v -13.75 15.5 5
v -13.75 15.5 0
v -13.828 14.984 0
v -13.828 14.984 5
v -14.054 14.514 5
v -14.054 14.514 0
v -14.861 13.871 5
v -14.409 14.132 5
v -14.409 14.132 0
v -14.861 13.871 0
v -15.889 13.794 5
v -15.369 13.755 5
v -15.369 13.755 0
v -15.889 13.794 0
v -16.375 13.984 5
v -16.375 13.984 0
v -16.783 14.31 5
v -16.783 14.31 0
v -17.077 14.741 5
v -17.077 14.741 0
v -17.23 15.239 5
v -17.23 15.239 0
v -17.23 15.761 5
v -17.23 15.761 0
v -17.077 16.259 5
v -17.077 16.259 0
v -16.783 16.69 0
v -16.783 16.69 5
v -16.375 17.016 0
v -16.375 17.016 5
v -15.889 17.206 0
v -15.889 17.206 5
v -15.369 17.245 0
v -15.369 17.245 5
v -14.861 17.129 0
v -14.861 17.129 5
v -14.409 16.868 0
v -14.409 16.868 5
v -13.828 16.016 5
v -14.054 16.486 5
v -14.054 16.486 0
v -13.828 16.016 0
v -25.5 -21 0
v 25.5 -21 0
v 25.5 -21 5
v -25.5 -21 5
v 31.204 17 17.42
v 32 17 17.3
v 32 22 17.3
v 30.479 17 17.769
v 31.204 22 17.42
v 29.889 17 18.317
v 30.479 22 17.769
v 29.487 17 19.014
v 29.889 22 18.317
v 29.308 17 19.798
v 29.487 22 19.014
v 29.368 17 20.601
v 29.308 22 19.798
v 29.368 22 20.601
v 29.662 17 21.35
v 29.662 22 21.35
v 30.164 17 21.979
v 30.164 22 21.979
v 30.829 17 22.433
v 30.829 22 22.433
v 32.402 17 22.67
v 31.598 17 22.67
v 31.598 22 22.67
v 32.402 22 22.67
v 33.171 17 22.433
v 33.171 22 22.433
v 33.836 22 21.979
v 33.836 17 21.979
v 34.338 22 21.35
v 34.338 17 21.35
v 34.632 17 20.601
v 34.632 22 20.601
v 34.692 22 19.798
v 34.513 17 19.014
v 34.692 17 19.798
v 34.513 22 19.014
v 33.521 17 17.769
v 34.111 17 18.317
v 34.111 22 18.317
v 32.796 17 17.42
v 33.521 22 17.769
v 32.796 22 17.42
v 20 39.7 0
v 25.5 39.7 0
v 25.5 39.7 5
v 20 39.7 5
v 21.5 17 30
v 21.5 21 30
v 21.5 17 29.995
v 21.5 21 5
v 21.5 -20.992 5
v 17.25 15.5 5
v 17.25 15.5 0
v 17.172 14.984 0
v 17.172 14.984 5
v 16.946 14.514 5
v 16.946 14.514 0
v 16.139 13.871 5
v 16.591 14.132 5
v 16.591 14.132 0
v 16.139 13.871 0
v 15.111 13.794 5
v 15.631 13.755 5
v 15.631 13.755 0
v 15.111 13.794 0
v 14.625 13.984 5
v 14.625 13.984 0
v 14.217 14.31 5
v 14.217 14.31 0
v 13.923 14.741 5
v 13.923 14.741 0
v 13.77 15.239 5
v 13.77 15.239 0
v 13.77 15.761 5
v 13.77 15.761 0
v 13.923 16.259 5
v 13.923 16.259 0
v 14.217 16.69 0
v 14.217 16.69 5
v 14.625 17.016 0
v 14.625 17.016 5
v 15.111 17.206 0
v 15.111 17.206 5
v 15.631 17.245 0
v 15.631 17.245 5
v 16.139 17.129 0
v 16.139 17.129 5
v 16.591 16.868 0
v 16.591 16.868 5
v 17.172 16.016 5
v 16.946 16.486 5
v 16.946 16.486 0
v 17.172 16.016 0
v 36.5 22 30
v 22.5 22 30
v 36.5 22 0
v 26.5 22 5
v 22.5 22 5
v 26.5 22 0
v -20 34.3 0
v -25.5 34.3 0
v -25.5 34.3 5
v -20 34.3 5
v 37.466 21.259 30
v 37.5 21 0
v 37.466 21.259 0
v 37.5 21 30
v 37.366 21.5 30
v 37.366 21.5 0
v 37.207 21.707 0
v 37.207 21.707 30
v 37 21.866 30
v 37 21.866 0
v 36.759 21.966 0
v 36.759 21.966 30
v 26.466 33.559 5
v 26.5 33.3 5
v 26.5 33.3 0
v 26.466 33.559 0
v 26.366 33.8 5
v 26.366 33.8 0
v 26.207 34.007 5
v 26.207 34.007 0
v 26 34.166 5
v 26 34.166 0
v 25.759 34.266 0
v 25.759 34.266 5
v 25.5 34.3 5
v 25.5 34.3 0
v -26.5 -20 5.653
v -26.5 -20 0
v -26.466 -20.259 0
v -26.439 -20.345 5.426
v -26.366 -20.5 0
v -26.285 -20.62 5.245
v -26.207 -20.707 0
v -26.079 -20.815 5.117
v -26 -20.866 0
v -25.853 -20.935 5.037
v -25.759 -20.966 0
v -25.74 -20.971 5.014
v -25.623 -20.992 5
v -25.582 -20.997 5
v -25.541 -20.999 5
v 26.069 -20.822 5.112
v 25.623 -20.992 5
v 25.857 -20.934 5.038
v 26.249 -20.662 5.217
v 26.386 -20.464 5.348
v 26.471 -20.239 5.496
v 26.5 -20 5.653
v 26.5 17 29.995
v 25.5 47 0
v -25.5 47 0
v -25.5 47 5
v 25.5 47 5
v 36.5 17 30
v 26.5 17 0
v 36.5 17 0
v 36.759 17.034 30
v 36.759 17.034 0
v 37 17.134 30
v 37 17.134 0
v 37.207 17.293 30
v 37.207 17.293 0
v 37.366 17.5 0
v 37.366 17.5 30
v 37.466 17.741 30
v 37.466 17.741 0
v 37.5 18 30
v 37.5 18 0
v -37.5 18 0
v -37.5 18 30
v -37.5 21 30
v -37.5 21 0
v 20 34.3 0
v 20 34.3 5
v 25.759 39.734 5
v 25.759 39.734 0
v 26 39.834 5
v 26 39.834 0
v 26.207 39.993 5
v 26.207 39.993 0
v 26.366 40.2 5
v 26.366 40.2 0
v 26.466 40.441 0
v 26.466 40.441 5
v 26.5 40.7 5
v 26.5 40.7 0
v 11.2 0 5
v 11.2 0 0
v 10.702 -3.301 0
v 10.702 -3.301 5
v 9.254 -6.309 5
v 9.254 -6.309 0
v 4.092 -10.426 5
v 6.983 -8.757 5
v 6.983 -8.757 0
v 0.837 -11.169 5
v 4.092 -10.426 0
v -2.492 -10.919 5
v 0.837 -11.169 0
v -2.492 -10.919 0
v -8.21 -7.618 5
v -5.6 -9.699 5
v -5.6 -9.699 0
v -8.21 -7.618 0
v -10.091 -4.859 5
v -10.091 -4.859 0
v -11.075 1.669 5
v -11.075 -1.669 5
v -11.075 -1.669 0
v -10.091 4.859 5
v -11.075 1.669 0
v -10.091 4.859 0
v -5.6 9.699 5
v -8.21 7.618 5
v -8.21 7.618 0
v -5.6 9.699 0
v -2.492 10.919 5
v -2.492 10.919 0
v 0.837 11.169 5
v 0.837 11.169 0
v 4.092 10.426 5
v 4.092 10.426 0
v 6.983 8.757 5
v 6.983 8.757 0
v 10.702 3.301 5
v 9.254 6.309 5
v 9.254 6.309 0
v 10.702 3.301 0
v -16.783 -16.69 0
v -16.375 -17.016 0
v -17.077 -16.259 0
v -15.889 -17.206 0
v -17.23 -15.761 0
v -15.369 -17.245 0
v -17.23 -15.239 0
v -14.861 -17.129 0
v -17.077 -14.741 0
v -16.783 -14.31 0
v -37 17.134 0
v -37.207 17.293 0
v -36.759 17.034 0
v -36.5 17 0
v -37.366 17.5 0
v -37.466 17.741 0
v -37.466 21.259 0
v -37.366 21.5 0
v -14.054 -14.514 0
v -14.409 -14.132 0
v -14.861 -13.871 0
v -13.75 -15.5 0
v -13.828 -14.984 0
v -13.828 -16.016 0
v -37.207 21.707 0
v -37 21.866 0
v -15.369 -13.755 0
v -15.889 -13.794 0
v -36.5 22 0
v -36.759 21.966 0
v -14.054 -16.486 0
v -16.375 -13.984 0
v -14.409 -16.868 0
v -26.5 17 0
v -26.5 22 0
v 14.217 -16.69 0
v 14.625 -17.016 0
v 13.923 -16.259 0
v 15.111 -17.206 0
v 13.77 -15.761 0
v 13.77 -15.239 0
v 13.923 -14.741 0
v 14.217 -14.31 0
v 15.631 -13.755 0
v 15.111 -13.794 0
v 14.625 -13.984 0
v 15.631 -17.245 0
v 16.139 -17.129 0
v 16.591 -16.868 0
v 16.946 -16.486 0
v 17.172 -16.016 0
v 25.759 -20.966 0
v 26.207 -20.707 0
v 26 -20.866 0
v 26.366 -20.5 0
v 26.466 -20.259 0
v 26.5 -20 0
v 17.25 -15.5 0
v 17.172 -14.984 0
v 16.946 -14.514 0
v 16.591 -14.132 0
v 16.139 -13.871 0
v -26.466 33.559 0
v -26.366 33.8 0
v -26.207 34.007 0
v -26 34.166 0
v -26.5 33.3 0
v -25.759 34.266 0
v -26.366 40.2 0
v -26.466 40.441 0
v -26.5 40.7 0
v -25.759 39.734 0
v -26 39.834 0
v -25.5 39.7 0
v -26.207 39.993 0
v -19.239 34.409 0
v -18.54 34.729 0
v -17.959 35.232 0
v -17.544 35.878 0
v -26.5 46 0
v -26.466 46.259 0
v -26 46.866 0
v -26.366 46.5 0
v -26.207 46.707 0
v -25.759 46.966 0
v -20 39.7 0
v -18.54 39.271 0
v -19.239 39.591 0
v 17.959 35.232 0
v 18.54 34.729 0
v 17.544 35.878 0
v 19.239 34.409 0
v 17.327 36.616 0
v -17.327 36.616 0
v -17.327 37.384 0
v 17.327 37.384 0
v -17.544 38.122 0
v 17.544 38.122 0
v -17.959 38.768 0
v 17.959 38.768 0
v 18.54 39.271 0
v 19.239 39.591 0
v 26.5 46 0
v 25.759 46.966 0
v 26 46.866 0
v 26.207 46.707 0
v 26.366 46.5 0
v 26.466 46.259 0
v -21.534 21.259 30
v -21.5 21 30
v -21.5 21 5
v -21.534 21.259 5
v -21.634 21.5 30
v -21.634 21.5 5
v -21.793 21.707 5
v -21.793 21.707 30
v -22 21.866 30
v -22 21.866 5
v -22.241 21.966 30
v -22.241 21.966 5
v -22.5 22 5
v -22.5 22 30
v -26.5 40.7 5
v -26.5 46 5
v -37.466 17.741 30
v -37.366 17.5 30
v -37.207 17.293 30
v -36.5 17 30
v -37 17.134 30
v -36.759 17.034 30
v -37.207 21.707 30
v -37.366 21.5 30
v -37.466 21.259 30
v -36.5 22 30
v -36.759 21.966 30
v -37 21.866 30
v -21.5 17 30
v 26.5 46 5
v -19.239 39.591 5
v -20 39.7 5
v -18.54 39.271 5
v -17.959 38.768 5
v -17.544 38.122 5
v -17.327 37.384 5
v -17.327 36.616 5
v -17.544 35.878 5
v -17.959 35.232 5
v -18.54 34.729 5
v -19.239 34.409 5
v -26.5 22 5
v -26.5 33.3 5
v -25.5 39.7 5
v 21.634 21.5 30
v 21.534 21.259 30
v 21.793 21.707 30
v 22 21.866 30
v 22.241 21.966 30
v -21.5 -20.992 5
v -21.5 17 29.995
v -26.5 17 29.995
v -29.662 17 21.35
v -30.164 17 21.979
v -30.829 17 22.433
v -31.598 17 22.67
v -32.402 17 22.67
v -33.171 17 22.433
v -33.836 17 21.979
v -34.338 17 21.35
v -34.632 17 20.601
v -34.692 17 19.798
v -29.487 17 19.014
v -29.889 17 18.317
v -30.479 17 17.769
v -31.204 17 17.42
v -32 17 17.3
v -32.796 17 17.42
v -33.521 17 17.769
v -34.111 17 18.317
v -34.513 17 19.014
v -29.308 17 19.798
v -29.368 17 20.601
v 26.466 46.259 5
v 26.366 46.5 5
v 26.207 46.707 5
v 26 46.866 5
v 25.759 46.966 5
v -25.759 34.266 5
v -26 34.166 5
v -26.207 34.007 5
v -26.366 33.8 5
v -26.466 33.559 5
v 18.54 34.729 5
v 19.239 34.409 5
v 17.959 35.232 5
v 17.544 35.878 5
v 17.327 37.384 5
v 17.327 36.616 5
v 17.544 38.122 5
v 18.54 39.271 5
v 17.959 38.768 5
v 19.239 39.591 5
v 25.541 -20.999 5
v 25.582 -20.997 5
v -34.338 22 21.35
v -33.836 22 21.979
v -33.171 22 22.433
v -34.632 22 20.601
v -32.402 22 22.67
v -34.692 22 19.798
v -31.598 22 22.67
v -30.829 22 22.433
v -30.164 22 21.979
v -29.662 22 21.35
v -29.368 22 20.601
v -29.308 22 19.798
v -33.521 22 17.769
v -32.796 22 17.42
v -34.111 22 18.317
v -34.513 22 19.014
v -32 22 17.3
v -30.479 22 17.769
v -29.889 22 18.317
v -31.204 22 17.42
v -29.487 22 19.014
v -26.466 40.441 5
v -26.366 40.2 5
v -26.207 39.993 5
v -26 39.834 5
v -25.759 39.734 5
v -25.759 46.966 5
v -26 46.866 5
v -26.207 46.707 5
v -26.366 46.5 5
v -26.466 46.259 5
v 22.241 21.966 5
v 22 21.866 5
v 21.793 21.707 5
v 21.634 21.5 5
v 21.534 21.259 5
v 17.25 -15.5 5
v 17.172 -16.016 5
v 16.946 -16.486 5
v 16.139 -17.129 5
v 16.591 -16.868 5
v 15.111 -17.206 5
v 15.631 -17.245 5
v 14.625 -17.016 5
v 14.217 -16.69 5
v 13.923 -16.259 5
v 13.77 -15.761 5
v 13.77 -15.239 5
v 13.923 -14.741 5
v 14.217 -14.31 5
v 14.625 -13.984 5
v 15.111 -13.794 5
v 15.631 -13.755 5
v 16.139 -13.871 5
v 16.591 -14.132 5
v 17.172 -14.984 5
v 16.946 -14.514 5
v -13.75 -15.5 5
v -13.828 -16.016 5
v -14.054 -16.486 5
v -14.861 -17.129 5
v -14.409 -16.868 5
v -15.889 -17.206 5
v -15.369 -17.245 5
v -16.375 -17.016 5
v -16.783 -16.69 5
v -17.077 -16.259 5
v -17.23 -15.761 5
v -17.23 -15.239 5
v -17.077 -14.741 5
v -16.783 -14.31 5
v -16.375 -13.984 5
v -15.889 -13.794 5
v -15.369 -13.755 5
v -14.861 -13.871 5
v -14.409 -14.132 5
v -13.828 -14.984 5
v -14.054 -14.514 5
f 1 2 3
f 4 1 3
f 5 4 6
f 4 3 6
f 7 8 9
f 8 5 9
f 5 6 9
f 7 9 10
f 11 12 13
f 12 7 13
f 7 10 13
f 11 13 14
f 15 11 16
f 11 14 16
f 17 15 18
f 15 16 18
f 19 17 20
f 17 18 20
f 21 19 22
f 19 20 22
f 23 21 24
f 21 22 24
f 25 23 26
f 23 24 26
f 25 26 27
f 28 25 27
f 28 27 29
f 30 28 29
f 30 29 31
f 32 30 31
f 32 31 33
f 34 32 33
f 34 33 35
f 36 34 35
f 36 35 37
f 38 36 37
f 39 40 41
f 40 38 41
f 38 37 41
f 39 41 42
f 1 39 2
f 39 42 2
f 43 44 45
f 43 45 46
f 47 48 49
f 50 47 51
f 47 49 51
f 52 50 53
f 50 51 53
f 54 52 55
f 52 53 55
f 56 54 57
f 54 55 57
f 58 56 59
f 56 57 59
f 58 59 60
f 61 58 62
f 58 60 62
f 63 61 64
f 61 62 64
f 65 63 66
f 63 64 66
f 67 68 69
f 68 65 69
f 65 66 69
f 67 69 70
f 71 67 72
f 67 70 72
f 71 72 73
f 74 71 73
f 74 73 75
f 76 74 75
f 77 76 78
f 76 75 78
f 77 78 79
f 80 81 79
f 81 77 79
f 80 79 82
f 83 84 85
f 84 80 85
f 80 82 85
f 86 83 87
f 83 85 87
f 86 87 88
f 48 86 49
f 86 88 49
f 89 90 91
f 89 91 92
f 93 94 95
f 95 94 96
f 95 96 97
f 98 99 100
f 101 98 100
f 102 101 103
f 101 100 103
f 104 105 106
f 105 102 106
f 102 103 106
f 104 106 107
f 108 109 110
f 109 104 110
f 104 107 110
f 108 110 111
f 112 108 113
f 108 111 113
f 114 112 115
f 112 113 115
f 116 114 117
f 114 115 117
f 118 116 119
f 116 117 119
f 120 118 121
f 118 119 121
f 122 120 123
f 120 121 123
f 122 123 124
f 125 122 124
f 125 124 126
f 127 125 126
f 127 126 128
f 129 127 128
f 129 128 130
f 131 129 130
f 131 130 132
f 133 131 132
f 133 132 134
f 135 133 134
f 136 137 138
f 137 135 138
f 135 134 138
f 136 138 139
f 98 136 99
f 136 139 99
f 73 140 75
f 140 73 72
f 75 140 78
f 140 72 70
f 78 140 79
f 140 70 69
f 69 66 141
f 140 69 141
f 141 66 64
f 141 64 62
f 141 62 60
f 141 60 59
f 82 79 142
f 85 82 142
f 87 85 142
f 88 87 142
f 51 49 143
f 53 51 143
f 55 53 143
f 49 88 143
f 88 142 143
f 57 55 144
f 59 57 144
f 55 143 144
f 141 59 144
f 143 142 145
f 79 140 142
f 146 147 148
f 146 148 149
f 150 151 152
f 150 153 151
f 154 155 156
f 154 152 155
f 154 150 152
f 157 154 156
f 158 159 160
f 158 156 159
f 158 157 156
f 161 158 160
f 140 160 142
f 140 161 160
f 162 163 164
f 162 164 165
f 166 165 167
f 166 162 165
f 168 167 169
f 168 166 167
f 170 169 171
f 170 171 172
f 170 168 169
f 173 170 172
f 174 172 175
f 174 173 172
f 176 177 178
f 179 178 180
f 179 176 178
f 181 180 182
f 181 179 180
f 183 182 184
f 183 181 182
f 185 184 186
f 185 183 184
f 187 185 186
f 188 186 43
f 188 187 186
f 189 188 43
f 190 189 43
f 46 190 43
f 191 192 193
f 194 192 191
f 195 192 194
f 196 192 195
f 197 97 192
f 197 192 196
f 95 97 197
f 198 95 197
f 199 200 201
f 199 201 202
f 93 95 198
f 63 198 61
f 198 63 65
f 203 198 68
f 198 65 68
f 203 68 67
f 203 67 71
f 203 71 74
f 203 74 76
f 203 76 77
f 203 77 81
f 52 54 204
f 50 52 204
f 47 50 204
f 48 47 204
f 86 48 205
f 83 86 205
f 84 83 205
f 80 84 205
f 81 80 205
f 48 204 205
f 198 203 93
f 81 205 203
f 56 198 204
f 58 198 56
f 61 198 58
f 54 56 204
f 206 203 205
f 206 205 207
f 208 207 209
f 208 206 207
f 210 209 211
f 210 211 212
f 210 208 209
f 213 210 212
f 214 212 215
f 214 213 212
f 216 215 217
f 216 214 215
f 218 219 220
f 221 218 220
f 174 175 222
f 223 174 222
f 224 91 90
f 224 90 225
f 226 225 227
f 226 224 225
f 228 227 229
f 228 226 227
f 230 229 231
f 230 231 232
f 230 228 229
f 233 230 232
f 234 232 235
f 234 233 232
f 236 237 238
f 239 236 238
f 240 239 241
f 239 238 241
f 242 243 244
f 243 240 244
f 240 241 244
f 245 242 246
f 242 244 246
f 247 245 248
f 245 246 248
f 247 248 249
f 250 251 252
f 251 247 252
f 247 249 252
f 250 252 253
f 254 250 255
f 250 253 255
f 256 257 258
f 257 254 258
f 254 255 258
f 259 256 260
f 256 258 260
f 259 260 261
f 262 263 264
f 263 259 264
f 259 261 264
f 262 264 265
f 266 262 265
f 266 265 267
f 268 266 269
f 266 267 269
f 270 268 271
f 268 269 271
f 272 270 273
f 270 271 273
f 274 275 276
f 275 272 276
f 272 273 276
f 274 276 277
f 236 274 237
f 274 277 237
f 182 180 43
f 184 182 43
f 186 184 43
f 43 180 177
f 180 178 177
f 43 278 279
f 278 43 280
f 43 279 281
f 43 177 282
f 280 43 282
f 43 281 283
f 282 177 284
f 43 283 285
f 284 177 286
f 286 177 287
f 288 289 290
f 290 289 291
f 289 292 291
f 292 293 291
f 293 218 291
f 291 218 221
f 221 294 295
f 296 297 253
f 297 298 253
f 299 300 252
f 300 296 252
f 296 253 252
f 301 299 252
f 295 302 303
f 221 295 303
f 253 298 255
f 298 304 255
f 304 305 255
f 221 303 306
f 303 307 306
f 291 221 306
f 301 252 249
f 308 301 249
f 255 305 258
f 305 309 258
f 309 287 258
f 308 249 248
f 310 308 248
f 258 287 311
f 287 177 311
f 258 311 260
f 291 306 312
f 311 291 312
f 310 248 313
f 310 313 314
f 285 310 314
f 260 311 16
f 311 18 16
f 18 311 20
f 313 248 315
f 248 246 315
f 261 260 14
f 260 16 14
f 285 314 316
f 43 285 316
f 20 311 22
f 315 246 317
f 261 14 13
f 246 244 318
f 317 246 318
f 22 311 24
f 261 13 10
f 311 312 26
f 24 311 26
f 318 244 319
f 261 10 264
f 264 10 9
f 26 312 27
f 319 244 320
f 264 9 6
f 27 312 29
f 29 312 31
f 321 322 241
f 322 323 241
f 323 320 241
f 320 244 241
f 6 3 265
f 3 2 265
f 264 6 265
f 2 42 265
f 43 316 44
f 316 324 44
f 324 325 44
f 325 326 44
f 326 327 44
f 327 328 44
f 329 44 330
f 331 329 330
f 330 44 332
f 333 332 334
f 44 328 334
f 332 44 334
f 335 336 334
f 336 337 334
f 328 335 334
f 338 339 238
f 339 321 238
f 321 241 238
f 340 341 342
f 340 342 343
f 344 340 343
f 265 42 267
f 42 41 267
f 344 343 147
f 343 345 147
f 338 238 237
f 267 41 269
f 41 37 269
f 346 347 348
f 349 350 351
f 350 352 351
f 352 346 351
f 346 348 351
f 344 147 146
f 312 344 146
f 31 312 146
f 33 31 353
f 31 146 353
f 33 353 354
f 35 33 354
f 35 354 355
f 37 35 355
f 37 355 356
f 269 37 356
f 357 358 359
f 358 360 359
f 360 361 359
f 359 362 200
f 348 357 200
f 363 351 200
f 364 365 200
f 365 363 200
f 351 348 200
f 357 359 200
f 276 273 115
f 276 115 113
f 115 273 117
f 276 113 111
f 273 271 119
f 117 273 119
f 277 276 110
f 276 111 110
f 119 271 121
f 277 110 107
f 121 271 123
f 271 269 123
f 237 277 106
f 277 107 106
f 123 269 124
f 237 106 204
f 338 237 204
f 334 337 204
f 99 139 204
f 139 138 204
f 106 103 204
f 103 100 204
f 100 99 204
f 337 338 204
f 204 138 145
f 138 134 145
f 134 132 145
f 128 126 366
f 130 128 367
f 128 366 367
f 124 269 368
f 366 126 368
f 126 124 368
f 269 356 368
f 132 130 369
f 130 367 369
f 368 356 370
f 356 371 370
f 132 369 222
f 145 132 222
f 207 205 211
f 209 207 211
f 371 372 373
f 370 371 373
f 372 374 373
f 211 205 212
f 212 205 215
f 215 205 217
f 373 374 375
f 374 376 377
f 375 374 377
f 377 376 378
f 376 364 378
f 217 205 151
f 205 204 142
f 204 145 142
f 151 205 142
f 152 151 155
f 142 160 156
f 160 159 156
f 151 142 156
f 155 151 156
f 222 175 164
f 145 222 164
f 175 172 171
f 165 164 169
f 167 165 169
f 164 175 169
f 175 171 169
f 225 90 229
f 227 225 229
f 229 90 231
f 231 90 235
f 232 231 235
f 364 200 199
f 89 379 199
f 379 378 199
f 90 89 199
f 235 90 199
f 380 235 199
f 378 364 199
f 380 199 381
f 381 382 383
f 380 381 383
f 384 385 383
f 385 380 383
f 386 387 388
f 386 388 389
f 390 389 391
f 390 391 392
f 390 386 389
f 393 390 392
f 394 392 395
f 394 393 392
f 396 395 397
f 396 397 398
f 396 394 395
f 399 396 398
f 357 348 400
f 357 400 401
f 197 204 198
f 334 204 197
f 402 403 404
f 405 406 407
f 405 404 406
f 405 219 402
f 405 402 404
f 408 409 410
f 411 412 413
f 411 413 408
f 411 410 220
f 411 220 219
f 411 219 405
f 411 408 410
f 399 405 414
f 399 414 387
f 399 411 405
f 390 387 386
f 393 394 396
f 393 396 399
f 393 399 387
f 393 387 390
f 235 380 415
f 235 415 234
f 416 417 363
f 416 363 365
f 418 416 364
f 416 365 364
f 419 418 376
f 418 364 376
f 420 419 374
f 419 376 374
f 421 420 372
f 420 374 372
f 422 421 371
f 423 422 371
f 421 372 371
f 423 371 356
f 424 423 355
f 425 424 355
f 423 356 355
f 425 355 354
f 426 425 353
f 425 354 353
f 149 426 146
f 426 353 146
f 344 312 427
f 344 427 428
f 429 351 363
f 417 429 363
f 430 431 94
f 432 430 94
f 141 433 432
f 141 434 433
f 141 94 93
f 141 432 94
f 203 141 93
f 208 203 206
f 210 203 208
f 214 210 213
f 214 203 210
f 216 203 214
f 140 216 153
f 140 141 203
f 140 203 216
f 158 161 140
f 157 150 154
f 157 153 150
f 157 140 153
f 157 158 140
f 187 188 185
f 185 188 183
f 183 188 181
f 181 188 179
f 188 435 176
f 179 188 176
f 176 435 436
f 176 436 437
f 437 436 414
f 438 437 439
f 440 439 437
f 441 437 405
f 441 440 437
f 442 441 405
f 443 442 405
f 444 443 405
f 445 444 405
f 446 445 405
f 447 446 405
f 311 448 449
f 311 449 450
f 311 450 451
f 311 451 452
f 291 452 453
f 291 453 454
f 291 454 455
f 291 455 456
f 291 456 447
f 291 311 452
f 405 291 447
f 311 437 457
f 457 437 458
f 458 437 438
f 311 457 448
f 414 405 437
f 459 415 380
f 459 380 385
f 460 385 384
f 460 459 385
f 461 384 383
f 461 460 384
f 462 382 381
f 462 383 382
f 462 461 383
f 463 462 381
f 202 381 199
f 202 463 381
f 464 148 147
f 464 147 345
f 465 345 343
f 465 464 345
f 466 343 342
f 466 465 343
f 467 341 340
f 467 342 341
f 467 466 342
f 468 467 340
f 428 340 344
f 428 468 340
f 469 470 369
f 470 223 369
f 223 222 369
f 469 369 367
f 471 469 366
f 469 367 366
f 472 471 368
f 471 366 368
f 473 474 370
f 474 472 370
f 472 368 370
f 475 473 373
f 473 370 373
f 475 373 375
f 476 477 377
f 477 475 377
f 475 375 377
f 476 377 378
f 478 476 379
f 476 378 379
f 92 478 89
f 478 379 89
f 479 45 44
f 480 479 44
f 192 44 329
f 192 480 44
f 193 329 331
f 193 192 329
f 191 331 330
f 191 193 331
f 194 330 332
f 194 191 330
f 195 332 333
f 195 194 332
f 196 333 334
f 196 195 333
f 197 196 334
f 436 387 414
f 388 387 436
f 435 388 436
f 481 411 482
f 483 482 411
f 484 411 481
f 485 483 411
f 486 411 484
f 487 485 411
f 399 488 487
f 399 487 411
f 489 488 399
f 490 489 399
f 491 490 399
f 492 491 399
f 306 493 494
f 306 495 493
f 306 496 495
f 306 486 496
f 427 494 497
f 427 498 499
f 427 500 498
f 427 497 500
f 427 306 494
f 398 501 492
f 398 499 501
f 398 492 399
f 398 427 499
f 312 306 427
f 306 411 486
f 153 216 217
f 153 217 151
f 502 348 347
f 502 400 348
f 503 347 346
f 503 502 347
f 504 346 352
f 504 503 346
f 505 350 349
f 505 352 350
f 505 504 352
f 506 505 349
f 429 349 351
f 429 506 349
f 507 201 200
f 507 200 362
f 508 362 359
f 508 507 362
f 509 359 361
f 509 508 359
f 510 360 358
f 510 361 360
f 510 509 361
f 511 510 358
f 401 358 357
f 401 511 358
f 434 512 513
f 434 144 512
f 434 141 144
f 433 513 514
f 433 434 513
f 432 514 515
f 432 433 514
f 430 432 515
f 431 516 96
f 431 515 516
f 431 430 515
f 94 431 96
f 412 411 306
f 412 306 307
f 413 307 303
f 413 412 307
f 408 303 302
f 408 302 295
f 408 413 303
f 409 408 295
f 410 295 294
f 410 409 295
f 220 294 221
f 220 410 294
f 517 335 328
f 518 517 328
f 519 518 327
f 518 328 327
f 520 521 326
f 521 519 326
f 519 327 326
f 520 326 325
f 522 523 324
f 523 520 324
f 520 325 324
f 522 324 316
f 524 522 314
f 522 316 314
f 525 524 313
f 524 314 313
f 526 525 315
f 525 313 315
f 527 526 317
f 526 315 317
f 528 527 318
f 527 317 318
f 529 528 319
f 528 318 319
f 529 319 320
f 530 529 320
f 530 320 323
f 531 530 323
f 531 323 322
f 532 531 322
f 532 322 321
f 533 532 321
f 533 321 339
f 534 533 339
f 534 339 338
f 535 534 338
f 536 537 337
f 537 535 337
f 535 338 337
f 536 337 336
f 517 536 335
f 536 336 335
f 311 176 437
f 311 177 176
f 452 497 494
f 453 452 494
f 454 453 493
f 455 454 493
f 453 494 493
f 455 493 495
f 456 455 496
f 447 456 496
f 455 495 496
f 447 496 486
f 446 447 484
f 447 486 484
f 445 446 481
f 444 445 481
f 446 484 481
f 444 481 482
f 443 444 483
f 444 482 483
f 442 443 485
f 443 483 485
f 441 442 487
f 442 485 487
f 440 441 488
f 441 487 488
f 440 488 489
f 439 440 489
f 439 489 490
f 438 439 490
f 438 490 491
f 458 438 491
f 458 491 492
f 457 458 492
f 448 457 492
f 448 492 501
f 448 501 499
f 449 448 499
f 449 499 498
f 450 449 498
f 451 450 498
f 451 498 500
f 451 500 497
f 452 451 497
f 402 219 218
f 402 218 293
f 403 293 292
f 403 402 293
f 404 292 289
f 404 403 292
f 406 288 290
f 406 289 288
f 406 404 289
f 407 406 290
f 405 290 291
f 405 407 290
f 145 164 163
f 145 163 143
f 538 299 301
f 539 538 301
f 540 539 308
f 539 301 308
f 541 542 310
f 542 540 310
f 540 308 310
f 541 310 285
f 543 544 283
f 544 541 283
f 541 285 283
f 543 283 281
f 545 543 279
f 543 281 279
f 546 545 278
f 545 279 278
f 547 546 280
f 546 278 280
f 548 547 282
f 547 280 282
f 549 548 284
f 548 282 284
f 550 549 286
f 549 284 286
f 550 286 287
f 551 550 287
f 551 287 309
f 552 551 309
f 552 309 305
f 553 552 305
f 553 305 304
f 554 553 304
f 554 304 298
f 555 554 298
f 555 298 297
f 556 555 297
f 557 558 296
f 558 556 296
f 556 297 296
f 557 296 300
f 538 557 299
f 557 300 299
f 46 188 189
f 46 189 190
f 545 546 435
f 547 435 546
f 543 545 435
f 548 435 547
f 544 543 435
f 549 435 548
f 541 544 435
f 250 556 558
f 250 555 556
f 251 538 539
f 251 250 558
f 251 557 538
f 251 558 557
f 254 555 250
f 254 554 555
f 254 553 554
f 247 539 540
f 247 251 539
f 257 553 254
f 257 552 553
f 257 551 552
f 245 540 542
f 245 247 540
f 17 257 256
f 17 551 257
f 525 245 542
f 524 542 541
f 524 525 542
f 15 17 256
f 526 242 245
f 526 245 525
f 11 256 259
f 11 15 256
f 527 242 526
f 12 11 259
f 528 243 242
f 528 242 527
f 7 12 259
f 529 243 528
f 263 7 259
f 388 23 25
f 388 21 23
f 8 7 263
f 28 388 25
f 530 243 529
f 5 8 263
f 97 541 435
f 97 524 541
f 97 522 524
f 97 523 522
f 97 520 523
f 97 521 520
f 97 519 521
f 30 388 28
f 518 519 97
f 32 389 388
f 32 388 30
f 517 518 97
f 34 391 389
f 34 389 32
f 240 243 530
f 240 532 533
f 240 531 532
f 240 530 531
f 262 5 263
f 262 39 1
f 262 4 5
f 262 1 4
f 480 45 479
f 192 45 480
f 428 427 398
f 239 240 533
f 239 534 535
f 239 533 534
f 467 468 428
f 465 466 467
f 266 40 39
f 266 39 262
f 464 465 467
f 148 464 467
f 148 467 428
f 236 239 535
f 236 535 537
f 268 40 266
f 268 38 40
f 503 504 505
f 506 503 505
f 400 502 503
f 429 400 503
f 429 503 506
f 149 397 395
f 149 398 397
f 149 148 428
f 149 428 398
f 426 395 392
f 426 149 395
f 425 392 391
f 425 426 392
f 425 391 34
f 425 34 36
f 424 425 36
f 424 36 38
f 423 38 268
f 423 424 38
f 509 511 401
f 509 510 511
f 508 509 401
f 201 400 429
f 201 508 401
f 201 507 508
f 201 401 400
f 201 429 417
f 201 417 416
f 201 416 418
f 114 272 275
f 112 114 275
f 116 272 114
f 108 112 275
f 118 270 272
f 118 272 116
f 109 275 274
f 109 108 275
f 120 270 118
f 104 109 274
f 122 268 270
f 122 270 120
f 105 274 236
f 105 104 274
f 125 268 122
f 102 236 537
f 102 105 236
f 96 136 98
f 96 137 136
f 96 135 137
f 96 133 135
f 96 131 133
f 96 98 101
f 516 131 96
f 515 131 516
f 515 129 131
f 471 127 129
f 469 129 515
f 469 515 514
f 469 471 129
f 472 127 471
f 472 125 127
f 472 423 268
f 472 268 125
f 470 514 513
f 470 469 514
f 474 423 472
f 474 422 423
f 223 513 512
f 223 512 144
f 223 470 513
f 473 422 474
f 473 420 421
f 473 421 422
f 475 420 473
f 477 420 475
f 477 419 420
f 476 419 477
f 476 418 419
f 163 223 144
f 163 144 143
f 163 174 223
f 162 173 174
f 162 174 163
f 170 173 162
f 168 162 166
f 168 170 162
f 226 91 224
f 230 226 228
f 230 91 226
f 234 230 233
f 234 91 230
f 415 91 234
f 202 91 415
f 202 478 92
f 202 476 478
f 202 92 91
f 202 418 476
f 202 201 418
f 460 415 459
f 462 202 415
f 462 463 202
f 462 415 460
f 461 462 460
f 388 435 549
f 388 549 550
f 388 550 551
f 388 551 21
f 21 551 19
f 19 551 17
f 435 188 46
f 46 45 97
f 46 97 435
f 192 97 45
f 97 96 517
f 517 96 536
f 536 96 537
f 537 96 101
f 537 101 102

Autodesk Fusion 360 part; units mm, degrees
sketch "スケッチ1" plane through (0, 0, 0) normal (0, 0, 1) x (1, 0, 0)
  line L0 (-26.5, 47) -> (26.5, 47)
  line L1 (26.5, 47) -> (26.5, -21)
  line L2 (26.5, -21) -> (-26.5, -21)
  line L3 (-26.5, -21) -> (-26.5, 47)
  circle A0 centre (0, 0) radius 11.2
  circle A1 centre (-15.5, -15.5) radius 1.75
  circle A2 centre (15.5, -15.5) radius 1.75
  circle A3 centre (15.5, 15.5) radius 1.75
  circle A4 centre (-15.5, 15.5) radius 1.75
  line L4 (21.5, 17) -> (37.5, 17)
  line L5 (37.5, 17) -> (37.5, 22)
  line L6 (37.5, 22) -> (21.5, 22)
  line L7 (21.5, 22) -> (21.5, 17)
  circle A5 centre (20, 37) radius 2.7
  line L8 (0, 0) -> (0, 47) construction
  line L9 (-37.5, 22) -> (-21.5, 22)
  line L10 (-21.5, 22) -> (-21.5, 17)
  line L11 (-21.5, 17) -> (-37.5, 17)
  line L12 (-37.5, 17) -> (-37.5, 22)
  circle A6 centre (-20, 37) radius 2.7
  line L13 (26.5, 39.7) -> (20, 39.7)
  line L14 (26.5, 34.3) -> (20, 34.3)
  line L15 (-26.5, 34.3) -> (-20, 34.3)
  line L16 (-26.5, 39.7) -> (-20, 39.7)
  dimension "d1" = 53
  dimension "d2" = 68
  dimension "d3" = 26.5
  dimension "d4" = 21
  dimension "d5" = 22.4
  dimension "d6" = 3.5
  dimension "d7" = 15.5
  dimension "d8" = 15.5
  dimension "d10" = 360
  dimension "d11" = 16
  dimension "d12" = 5
  dimension "d13" = 11
  dimension "d14" = 25
  dimension "d15" = 5.4
  dimension "d16" = 10
  dimension "d17" = 6.5
extrude "押し出し1" add sketch "スケッチ1" along normal blind 5 contours L0 L1 L2 L3 L4 L6 L7 A5 L9 L10 L11 A6 L13 L14 L15 L16
extrude "押し出し2" add sketch "スケッチ1" along normal blind 30 contours L3 L9 L10 L11 | L3 L9 L11 L12 | L1 L4 L5 L6 | L1 L4 L6 L7
chamfer "面取り1" distance 38 distance2 25 2 edges at (24, 17, 5) (-24, 17, 5) measured on face at (0.279, 27.7319, 5) measured on face at (0.279, 27.7319, 5)
fillet "フィレット1" radius 1 14 edges at (-37.5, 17, 15) (-37.5, 22, 15) (-26.5, -21, 2.5) (-26.5, 34.3, 2.5) (-26.5, 39.7, 2.5) (-26.5, 47, 2.5) (26.5, 47, 2.5) (26.5, 39.7, 2.5) (26.5, 34.3, 2.5) (37.5, 22, 15) (37.5, 17, 15) (21.5, 22, 17.5) (-21.5, 22, 17.5) (26.5, -21, 2.5)
hole "穴1" at (-32, 17, 20) direction (0, 1, 0) diameter 5.4 depth 11 tip angle 118
mirror "ミラー1" about plane through (0, 0, 0) normal (1, 0, 0) of "穴1"
equation "d3 = d1 / 2"
